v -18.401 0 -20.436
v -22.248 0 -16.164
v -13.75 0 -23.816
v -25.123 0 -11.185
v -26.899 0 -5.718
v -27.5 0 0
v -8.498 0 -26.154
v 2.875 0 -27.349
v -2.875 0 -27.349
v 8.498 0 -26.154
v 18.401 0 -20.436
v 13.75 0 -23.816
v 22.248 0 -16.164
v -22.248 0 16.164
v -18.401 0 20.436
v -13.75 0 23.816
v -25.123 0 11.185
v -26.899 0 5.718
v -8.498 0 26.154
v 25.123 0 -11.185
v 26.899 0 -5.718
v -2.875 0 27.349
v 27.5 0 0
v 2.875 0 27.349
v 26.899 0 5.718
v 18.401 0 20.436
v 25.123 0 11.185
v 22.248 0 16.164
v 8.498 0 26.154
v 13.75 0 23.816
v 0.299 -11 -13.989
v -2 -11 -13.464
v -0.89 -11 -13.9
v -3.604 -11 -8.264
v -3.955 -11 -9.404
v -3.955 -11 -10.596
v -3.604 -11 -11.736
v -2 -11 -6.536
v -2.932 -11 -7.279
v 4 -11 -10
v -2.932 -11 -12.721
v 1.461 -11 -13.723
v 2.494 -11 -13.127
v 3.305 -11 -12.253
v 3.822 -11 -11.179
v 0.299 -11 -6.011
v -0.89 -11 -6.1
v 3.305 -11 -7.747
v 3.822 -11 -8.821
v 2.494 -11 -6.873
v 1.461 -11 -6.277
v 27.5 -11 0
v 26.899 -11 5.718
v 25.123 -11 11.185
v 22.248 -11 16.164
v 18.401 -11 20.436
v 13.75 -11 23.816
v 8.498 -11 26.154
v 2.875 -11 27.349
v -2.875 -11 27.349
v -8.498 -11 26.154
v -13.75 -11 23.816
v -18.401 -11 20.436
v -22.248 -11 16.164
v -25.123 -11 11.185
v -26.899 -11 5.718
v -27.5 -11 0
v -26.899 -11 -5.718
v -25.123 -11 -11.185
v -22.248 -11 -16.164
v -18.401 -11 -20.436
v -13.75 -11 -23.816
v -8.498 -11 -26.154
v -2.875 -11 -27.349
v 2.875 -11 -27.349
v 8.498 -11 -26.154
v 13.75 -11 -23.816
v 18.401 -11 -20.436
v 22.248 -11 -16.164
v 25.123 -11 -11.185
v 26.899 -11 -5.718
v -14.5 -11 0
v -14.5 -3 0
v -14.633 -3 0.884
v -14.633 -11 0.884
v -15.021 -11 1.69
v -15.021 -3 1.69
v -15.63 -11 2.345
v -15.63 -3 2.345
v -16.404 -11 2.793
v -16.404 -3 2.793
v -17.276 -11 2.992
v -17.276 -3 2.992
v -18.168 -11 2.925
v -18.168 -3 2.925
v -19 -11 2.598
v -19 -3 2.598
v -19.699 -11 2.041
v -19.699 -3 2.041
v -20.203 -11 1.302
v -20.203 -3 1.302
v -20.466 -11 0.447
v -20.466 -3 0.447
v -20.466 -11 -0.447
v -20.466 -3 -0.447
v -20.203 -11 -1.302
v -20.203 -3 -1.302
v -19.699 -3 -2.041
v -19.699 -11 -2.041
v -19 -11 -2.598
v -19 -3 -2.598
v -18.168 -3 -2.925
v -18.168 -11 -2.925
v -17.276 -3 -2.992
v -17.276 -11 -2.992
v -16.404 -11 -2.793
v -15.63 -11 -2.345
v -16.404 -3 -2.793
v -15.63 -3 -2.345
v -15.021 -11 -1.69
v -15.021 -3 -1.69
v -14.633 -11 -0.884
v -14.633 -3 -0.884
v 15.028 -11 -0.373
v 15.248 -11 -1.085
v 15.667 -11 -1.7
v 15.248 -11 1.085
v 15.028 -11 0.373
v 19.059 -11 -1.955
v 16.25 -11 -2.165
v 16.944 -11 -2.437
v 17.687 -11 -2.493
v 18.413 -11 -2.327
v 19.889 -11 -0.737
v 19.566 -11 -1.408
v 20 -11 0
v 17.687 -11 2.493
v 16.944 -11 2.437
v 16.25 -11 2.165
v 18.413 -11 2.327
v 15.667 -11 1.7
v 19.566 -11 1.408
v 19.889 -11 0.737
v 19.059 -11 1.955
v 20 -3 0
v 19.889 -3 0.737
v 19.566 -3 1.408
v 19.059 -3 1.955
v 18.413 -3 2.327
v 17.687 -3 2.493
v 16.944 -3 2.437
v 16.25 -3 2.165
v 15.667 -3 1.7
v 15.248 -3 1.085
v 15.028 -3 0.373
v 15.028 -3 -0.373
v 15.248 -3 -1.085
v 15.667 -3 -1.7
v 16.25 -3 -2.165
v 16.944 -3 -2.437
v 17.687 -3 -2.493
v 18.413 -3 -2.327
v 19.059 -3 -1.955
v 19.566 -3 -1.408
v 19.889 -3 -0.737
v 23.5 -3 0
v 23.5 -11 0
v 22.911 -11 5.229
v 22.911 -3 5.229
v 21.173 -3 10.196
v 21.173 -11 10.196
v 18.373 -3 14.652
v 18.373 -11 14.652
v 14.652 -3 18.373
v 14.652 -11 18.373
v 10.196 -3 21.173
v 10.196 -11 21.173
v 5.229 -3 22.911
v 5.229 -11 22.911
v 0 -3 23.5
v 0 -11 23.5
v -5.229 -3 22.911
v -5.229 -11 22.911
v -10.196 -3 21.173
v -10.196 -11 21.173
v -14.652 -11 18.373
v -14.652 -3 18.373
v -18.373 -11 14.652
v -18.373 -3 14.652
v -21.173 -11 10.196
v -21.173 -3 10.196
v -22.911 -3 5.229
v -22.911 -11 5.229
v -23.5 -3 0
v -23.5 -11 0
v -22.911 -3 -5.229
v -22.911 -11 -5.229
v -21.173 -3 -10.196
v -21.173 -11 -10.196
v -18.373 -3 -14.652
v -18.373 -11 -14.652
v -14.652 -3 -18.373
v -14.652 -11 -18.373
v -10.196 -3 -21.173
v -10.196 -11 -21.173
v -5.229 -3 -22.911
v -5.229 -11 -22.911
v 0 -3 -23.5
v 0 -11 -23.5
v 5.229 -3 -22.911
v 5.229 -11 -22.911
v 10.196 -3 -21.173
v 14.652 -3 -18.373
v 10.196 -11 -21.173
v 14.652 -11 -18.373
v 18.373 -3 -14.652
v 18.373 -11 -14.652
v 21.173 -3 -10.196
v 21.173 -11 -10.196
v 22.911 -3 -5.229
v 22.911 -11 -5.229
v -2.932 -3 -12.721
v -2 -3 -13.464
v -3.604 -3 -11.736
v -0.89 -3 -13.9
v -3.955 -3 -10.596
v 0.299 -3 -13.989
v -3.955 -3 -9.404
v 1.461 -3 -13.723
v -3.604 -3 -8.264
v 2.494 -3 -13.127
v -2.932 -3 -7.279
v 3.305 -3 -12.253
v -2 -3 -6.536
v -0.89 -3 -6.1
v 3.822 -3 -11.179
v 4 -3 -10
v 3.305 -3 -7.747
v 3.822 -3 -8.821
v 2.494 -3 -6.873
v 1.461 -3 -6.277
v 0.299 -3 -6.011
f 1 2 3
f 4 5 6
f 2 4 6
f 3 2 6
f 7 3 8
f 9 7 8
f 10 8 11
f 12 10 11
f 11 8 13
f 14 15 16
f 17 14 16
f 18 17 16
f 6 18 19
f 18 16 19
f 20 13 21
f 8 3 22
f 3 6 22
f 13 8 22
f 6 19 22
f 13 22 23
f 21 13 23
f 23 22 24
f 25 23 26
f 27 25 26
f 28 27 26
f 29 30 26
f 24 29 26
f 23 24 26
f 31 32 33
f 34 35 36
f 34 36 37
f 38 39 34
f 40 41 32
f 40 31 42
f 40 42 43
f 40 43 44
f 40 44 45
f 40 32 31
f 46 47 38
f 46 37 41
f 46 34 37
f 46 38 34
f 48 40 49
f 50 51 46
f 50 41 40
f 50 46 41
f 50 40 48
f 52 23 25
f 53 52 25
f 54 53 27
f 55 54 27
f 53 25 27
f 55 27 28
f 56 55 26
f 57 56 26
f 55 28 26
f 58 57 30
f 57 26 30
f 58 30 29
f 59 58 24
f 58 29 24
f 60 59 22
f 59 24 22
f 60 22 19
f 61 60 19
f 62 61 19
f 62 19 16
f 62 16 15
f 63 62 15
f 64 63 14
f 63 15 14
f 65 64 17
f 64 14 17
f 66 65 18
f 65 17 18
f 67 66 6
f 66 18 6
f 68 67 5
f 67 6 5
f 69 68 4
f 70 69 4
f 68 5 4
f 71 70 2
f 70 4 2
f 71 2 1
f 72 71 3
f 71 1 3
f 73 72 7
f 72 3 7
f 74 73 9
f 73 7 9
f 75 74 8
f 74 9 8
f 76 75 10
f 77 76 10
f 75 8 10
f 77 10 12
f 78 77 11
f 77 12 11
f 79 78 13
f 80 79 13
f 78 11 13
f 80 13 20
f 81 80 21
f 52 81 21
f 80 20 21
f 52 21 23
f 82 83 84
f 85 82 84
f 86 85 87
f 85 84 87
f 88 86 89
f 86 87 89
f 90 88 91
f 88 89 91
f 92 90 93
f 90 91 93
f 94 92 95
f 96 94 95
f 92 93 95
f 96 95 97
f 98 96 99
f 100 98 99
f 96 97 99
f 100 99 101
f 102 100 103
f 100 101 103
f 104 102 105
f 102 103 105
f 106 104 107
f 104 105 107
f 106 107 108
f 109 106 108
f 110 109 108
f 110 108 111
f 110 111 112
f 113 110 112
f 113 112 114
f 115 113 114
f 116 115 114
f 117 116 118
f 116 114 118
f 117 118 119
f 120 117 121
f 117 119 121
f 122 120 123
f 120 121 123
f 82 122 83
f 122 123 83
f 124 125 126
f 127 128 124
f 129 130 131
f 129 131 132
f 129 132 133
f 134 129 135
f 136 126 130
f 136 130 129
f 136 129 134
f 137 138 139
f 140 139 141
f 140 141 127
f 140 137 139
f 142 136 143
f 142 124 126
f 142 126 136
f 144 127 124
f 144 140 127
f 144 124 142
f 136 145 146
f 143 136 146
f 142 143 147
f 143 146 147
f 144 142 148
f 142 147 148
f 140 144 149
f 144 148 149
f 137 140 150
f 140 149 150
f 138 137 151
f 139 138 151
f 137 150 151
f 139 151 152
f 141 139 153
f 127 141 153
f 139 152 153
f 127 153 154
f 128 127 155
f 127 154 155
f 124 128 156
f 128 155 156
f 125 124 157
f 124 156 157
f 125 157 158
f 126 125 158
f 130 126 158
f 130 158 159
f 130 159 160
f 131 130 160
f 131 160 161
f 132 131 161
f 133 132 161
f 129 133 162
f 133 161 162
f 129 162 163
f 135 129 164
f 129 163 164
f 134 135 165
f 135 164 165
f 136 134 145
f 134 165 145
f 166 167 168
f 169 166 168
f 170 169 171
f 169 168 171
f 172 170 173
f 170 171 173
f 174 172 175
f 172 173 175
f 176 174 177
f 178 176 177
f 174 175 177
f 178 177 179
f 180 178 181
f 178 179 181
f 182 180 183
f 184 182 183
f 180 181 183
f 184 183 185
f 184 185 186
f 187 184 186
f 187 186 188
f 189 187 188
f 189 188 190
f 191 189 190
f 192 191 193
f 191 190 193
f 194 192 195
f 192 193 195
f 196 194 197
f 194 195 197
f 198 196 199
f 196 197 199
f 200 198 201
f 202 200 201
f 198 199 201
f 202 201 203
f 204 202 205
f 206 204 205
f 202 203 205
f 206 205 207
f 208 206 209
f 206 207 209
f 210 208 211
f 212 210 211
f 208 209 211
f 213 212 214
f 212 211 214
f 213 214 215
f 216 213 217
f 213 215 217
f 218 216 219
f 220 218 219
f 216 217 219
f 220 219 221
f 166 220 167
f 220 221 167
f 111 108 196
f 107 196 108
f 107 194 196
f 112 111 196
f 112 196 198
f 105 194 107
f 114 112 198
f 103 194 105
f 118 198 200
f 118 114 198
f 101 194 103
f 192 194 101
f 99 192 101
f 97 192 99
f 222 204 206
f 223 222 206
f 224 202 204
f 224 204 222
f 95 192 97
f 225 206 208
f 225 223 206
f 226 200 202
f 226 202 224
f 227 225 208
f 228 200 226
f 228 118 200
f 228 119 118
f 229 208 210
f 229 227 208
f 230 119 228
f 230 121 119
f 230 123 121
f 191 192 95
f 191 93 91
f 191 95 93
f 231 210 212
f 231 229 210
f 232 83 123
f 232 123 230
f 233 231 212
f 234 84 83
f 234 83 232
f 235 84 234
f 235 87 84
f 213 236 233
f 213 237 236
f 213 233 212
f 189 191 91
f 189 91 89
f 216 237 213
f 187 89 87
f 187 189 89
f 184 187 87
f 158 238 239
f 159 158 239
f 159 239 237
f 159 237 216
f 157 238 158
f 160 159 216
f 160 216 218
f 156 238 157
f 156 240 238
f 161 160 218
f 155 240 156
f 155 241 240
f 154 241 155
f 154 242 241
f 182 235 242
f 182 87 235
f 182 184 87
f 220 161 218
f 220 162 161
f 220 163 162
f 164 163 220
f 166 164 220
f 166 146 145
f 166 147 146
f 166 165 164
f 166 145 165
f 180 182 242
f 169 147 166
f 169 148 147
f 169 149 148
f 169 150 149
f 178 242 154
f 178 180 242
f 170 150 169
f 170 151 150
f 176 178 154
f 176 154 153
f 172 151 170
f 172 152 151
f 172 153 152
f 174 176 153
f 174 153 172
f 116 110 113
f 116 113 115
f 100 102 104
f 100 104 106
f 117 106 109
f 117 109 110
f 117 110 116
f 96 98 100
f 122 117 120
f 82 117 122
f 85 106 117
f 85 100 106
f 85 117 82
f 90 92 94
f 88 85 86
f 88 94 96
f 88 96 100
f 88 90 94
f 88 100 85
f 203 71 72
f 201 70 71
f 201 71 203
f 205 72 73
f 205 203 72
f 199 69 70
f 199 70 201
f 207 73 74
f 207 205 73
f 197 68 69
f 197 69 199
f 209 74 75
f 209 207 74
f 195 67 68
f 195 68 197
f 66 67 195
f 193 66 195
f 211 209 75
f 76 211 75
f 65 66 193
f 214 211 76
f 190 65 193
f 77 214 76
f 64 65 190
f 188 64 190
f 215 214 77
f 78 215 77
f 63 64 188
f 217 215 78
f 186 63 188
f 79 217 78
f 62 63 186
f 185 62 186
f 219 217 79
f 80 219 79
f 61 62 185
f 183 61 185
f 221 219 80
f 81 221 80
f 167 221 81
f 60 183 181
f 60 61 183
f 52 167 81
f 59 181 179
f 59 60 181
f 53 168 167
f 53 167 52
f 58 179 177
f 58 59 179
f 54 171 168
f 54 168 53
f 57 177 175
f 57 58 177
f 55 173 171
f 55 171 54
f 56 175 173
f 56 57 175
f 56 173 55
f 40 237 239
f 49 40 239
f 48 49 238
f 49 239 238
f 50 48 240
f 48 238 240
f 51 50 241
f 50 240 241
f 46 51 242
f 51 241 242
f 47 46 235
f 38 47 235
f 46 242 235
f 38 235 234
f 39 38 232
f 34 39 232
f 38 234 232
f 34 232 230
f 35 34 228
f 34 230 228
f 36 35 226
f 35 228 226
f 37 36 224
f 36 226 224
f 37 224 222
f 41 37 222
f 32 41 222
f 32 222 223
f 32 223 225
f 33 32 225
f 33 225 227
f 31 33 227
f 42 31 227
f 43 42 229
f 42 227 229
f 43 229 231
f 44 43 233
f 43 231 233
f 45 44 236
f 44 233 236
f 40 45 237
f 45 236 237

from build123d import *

# Parameters (mm, degrees)
F0_R     = 27.5
F1_DEPTH = 11
F2_R     = 23.5
F3_DEPTH = 8
F4_R     = 4
F4_R_2   = 3
F4_R_3   = 2.5
F5_DEPTH = 8


with BuildPart() as f1:
    # F0 (on Front) → F1 (new body)
    with BuildSketch(Plane.XZ):
        Circle(F0_R)
    extrude(amount=F1_DEPTH)

    # F2 (on face) → F3 (cut)
    with BuildSketch(Plane.XZ.offset(11)):
        Circle(F2_R)
    extrude(amount=-F3_DEPTH, mode=Mode.SUBTRACT)

    # F4 (on face) → F5 (join)
    with BuildSketch(Plane.XZ.offset(3)):
        with Locations((0, -10)):
            Circle(F4_R)
        with Locations((-17.5, 0)):
            Circle(F4_R_2)
        with Locations((17.5, 0)):
            Circle(F4_R_3)
    extrude(amount=F5_DEPTH)


solid = f1.part
